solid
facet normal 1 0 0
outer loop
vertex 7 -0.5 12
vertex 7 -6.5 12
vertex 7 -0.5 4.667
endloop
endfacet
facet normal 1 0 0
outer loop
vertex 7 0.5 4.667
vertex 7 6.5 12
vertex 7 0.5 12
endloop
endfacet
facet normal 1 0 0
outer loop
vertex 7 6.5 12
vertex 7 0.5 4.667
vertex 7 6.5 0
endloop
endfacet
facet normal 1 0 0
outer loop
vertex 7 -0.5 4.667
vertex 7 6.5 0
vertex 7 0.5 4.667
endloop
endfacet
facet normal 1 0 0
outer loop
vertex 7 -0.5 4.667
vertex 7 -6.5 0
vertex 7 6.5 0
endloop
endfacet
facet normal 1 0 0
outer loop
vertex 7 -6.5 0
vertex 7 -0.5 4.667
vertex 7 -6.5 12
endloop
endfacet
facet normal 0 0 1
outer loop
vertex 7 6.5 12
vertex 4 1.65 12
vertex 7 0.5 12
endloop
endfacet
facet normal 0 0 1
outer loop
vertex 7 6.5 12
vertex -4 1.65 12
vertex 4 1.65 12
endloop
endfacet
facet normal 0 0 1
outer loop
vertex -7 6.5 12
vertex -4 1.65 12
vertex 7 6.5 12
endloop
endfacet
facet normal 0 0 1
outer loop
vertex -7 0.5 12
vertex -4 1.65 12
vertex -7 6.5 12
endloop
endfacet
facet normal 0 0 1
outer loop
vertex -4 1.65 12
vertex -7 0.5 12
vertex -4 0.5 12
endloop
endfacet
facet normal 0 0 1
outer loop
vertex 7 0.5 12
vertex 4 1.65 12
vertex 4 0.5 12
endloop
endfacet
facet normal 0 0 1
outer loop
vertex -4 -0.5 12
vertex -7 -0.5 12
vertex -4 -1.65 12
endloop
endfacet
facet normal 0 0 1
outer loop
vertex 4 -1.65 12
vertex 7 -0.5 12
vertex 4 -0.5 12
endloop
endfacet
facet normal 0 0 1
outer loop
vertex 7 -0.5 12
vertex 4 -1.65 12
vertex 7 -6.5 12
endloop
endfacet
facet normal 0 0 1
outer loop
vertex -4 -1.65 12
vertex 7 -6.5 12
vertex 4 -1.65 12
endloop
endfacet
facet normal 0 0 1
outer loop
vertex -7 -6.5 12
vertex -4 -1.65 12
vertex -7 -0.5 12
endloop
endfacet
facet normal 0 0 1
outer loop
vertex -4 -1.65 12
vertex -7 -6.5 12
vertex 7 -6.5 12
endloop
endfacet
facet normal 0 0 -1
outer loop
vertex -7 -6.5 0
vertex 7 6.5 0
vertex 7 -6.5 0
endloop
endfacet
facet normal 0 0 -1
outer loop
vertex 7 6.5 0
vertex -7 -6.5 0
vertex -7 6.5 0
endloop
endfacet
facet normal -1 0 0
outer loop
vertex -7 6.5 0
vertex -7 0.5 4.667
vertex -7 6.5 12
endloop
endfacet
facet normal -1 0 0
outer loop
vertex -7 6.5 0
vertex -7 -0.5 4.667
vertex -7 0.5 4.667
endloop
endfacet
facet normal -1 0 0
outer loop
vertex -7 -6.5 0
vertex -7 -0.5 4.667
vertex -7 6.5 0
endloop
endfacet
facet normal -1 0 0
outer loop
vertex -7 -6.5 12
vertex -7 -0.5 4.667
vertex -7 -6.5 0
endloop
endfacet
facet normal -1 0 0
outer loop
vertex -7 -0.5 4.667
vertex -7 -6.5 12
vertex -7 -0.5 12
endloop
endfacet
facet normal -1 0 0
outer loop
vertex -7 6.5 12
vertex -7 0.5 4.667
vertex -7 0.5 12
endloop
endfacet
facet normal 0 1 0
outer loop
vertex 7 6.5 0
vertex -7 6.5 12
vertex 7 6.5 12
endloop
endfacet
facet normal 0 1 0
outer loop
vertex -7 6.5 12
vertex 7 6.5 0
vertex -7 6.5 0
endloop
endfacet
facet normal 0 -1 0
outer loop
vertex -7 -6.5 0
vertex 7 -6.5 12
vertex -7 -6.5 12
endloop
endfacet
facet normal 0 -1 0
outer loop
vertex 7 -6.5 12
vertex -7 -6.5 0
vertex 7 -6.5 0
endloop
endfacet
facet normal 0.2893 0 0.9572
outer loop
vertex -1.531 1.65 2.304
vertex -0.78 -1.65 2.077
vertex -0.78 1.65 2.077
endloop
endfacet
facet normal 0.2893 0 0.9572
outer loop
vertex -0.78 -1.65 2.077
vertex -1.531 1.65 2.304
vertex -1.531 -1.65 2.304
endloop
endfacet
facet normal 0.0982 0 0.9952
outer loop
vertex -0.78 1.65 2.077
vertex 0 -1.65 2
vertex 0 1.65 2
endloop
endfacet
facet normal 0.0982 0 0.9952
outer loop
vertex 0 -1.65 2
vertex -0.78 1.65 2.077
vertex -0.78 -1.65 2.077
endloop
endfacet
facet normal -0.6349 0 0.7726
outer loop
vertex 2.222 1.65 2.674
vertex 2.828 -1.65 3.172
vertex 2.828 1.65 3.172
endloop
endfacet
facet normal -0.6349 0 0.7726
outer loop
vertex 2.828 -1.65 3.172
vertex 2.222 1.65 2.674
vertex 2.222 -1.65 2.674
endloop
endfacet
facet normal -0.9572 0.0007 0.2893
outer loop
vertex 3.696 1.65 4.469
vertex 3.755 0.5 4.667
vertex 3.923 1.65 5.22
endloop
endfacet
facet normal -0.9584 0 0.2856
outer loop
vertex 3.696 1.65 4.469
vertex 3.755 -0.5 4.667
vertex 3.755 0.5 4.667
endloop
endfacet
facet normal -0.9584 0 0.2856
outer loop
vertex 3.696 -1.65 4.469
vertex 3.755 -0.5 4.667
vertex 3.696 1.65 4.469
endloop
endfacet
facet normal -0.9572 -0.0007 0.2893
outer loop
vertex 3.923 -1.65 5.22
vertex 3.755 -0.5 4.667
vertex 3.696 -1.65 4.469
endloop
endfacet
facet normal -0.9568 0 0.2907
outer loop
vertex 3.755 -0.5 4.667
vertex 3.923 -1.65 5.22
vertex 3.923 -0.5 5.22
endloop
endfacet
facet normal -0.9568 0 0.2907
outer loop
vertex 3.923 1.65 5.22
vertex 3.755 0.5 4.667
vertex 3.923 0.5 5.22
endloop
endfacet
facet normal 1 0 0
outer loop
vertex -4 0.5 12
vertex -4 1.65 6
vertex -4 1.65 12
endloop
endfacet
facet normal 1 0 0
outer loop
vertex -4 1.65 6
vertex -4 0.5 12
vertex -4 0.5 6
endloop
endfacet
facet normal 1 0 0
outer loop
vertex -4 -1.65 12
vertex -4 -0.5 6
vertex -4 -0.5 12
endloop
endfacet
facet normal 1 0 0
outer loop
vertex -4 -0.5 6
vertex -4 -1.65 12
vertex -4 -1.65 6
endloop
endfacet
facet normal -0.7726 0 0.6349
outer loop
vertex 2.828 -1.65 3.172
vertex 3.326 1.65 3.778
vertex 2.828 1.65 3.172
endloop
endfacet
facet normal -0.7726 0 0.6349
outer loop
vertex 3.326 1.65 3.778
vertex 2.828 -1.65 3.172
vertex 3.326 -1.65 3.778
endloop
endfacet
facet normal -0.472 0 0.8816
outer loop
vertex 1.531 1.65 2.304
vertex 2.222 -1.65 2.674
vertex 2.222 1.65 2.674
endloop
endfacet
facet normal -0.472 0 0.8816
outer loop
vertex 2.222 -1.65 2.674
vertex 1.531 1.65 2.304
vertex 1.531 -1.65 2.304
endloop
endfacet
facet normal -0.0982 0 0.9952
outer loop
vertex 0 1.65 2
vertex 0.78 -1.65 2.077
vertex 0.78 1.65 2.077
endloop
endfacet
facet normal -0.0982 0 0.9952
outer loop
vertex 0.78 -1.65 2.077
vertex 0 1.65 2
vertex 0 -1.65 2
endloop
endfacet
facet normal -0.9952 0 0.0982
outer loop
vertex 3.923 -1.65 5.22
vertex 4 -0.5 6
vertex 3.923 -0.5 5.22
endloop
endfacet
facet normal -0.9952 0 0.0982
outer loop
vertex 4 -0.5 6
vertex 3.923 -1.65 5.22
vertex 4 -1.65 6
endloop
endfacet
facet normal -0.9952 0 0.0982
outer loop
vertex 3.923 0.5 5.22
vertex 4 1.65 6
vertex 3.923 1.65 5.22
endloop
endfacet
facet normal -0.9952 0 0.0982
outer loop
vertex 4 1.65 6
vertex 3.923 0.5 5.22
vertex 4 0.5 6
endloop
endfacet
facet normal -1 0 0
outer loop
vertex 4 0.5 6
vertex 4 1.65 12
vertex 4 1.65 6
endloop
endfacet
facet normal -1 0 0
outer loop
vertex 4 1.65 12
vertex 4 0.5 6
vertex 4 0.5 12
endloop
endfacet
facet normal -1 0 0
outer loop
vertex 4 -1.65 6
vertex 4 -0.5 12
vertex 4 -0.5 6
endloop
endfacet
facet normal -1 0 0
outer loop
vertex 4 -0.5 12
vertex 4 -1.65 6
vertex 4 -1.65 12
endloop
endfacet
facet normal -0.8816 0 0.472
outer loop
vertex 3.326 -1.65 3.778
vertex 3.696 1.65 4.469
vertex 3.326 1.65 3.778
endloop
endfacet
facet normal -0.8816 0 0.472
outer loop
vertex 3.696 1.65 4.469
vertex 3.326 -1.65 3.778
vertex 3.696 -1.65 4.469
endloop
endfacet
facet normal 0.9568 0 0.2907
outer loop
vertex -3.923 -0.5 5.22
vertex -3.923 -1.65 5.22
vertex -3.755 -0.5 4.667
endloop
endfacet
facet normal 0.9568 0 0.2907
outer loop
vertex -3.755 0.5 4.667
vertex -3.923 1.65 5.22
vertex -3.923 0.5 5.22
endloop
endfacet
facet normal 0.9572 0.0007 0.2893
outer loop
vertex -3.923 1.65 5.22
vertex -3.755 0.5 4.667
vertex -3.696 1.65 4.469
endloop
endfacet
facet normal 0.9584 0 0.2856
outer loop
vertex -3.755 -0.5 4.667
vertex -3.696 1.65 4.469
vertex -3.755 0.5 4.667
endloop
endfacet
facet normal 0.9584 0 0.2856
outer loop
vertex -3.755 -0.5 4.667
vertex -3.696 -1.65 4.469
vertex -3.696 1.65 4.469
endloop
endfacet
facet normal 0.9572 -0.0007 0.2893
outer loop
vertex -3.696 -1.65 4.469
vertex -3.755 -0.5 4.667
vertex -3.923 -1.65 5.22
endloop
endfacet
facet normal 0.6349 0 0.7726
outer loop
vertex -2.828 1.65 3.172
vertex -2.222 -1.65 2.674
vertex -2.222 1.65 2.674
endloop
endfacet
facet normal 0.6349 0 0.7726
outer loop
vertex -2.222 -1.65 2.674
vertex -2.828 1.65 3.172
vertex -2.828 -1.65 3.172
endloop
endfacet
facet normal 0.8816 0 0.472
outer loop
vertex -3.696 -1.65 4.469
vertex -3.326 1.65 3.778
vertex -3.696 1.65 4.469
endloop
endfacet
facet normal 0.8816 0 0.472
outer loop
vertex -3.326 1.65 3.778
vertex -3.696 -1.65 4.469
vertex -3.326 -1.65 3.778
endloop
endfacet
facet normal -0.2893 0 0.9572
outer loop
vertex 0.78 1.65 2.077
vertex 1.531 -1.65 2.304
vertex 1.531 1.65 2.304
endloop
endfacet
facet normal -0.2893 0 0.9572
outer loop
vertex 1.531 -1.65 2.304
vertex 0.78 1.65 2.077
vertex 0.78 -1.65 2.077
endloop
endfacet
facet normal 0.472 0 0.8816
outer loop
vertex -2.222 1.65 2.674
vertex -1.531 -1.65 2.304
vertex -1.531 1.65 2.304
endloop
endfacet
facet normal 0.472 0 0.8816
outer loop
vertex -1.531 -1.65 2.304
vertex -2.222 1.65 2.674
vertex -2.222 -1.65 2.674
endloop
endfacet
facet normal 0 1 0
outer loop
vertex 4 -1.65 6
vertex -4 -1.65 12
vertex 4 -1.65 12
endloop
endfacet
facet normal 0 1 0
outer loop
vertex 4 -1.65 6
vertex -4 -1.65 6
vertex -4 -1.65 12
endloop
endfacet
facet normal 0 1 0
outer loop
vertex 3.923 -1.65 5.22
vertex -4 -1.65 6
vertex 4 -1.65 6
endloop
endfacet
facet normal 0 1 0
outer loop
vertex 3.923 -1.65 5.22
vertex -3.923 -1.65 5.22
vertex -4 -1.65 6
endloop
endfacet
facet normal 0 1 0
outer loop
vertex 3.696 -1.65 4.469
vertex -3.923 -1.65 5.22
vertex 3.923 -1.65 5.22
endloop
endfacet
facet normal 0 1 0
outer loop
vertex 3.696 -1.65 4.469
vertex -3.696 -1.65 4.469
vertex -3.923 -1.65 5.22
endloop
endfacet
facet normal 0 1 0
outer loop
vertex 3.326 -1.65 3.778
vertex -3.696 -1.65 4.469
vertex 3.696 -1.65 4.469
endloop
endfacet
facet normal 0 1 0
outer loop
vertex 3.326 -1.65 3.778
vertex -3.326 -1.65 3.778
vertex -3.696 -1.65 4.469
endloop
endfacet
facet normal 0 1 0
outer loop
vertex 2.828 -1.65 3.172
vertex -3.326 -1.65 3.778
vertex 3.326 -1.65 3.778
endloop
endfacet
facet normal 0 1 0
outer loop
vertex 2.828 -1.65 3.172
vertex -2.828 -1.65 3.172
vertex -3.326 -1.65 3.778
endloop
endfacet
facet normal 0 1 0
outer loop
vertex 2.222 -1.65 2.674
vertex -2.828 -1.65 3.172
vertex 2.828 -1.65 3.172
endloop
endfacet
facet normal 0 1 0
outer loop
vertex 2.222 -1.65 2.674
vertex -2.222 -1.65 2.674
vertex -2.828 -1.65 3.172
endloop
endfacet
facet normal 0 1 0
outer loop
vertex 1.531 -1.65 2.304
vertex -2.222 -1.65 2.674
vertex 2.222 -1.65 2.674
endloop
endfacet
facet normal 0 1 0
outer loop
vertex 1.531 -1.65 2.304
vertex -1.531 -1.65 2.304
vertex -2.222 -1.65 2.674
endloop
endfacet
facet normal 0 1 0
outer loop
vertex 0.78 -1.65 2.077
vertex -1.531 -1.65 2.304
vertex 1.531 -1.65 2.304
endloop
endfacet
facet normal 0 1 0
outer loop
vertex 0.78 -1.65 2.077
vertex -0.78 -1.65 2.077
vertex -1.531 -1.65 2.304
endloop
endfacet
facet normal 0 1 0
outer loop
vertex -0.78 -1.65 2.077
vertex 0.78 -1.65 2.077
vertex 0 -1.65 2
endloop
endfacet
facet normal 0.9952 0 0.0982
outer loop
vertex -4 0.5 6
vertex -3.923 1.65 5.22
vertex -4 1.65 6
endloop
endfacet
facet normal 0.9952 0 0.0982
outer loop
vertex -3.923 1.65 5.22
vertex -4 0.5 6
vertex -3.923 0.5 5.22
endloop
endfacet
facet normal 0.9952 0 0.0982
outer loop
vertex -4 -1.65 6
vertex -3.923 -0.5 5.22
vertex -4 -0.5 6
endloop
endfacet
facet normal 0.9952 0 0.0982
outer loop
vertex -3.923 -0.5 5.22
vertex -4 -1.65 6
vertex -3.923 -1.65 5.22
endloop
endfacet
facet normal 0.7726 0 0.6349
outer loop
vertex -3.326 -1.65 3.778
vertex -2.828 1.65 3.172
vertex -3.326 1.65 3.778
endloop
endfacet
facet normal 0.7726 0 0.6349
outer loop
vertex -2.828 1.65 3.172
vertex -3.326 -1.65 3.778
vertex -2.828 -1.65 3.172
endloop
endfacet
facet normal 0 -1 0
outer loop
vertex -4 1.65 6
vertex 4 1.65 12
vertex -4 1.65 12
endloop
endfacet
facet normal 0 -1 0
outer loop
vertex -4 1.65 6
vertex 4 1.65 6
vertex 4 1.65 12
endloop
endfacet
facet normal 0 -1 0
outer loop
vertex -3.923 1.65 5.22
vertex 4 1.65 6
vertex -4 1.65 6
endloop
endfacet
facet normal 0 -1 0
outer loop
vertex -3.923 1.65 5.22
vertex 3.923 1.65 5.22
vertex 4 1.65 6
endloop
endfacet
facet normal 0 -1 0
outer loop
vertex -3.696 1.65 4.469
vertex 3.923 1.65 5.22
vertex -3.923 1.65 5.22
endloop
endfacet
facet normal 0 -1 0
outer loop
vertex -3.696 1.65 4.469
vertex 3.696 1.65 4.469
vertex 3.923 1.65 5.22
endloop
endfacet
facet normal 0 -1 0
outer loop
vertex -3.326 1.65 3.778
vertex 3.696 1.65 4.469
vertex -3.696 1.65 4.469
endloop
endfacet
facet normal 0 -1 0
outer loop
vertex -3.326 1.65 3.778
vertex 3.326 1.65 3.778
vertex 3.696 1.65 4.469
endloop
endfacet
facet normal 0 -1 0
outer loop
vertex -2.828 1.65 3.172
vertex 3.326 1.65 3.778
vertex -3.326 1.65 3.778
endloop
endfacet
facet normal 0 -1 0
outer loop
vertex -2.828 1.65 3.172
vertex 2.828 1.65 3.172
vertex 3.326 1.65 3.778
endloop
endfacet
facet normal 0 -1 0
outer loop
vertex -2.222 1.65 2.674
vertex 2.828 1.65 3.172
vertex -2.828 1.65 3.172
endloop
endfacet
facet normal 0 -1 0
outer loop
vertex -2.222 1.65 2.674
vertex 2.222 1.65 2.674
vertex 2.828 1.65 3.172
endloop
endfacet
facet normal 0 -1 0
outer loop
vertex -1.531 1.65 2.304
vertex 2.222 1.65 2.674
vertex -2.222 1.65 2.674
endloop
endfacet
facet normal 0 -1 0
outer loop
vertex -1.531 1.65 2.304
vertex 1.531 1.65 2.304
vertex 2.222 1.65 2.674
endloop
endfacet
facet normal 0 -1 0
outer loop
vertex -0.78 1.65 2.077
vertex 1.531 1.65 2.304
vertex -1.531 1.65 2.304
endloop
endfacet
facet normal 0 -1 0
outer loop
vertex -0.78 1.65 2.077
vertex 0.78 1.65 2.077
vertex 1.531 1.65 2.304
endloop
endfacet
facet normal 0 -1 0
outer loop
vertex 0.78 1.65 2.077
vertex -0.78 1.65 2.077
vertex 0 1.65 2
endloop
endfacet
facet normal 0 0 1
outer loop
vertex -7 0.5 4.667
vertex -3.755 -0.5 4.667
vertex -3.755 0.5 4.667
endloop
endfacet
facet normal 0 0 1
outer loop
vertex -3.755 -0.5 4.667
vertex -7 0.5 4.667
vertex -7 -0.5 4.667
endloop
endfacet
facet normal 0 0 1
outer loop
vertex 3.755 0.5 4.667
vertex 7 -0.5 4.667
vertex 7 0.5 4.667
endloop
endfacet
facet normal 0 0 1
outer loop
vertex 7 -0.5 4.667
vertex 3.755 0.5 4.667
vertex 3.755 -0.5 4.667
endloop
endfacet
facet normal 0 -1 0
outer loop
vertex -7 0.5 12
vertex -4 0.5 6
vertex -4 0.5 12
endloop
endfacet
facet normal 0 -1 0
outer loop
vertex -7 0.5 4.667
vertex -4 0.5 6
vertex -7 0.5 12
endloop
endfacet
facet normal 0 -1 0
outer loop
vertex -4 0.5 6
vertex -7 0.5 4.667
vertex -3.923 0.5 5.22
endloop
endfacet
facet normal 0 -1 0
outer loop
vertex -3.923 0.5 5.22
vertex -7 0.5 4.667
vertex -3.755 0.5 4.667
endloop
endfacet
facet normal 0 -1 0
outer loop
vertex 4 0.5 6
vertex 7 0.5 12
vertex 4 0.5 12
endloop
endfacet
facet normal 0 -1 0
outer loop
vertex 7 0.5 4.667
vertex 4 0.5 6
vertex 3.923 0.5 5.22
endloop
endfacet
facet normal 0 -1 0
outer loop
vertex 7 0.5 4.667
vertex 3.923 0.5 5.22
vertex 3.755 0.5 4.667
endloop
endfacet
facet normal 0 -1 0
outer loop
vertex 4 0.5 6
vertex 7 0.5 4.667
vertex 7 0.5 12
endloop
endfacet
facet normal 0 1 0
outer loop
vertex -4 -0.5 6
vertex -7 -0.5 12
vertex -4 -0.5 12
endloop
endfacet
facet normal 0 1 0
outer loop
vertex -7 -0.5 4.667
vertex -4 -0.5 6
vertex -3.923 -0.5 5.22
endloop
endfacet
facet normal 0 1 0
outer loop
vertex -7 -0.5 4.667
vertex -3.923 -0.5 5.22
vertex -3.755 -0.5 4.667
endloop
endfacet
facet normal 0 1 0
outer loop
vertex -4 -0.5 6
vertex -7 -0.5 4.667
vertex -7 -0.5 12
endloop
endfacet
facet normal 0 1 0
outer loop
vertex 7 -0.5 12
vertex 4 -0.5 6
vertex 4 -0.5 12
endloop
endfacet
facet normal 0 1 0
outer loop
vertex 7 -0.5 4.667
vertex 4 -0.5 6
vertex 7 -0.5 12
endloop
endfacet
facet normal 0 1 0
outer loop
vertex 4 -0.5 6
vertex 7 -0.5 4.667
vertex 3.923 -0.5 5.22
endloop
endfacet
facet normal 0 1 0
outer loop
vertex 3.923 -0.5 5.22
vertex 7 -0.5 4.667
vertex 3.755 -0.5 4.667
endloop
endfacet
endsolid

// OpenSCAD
$fn = 32;

spacer_d = 8;
spacer_l = 3.3;

knife_w = 1;

w = 14;
l = 13;
h = 12;

base=2;

difference() {
  // Block
  translate([-w/2, -l/2, 0]) cube([w, l, h]);

  // spacer cavity
  hull() {
    for (i = [0: 1]) {
    translate([0, spacer_l/2, spacer_d/2+i*20+base]) rotate([90, 0, 0]) 
      cylinder(d=spacer_d, h=spacer_l);
    }
  }
  
  // Knife slot
  translate([-10, -knife_w/2, base+spacer_d/3]) cube([20, knife_w, 20]);
}
